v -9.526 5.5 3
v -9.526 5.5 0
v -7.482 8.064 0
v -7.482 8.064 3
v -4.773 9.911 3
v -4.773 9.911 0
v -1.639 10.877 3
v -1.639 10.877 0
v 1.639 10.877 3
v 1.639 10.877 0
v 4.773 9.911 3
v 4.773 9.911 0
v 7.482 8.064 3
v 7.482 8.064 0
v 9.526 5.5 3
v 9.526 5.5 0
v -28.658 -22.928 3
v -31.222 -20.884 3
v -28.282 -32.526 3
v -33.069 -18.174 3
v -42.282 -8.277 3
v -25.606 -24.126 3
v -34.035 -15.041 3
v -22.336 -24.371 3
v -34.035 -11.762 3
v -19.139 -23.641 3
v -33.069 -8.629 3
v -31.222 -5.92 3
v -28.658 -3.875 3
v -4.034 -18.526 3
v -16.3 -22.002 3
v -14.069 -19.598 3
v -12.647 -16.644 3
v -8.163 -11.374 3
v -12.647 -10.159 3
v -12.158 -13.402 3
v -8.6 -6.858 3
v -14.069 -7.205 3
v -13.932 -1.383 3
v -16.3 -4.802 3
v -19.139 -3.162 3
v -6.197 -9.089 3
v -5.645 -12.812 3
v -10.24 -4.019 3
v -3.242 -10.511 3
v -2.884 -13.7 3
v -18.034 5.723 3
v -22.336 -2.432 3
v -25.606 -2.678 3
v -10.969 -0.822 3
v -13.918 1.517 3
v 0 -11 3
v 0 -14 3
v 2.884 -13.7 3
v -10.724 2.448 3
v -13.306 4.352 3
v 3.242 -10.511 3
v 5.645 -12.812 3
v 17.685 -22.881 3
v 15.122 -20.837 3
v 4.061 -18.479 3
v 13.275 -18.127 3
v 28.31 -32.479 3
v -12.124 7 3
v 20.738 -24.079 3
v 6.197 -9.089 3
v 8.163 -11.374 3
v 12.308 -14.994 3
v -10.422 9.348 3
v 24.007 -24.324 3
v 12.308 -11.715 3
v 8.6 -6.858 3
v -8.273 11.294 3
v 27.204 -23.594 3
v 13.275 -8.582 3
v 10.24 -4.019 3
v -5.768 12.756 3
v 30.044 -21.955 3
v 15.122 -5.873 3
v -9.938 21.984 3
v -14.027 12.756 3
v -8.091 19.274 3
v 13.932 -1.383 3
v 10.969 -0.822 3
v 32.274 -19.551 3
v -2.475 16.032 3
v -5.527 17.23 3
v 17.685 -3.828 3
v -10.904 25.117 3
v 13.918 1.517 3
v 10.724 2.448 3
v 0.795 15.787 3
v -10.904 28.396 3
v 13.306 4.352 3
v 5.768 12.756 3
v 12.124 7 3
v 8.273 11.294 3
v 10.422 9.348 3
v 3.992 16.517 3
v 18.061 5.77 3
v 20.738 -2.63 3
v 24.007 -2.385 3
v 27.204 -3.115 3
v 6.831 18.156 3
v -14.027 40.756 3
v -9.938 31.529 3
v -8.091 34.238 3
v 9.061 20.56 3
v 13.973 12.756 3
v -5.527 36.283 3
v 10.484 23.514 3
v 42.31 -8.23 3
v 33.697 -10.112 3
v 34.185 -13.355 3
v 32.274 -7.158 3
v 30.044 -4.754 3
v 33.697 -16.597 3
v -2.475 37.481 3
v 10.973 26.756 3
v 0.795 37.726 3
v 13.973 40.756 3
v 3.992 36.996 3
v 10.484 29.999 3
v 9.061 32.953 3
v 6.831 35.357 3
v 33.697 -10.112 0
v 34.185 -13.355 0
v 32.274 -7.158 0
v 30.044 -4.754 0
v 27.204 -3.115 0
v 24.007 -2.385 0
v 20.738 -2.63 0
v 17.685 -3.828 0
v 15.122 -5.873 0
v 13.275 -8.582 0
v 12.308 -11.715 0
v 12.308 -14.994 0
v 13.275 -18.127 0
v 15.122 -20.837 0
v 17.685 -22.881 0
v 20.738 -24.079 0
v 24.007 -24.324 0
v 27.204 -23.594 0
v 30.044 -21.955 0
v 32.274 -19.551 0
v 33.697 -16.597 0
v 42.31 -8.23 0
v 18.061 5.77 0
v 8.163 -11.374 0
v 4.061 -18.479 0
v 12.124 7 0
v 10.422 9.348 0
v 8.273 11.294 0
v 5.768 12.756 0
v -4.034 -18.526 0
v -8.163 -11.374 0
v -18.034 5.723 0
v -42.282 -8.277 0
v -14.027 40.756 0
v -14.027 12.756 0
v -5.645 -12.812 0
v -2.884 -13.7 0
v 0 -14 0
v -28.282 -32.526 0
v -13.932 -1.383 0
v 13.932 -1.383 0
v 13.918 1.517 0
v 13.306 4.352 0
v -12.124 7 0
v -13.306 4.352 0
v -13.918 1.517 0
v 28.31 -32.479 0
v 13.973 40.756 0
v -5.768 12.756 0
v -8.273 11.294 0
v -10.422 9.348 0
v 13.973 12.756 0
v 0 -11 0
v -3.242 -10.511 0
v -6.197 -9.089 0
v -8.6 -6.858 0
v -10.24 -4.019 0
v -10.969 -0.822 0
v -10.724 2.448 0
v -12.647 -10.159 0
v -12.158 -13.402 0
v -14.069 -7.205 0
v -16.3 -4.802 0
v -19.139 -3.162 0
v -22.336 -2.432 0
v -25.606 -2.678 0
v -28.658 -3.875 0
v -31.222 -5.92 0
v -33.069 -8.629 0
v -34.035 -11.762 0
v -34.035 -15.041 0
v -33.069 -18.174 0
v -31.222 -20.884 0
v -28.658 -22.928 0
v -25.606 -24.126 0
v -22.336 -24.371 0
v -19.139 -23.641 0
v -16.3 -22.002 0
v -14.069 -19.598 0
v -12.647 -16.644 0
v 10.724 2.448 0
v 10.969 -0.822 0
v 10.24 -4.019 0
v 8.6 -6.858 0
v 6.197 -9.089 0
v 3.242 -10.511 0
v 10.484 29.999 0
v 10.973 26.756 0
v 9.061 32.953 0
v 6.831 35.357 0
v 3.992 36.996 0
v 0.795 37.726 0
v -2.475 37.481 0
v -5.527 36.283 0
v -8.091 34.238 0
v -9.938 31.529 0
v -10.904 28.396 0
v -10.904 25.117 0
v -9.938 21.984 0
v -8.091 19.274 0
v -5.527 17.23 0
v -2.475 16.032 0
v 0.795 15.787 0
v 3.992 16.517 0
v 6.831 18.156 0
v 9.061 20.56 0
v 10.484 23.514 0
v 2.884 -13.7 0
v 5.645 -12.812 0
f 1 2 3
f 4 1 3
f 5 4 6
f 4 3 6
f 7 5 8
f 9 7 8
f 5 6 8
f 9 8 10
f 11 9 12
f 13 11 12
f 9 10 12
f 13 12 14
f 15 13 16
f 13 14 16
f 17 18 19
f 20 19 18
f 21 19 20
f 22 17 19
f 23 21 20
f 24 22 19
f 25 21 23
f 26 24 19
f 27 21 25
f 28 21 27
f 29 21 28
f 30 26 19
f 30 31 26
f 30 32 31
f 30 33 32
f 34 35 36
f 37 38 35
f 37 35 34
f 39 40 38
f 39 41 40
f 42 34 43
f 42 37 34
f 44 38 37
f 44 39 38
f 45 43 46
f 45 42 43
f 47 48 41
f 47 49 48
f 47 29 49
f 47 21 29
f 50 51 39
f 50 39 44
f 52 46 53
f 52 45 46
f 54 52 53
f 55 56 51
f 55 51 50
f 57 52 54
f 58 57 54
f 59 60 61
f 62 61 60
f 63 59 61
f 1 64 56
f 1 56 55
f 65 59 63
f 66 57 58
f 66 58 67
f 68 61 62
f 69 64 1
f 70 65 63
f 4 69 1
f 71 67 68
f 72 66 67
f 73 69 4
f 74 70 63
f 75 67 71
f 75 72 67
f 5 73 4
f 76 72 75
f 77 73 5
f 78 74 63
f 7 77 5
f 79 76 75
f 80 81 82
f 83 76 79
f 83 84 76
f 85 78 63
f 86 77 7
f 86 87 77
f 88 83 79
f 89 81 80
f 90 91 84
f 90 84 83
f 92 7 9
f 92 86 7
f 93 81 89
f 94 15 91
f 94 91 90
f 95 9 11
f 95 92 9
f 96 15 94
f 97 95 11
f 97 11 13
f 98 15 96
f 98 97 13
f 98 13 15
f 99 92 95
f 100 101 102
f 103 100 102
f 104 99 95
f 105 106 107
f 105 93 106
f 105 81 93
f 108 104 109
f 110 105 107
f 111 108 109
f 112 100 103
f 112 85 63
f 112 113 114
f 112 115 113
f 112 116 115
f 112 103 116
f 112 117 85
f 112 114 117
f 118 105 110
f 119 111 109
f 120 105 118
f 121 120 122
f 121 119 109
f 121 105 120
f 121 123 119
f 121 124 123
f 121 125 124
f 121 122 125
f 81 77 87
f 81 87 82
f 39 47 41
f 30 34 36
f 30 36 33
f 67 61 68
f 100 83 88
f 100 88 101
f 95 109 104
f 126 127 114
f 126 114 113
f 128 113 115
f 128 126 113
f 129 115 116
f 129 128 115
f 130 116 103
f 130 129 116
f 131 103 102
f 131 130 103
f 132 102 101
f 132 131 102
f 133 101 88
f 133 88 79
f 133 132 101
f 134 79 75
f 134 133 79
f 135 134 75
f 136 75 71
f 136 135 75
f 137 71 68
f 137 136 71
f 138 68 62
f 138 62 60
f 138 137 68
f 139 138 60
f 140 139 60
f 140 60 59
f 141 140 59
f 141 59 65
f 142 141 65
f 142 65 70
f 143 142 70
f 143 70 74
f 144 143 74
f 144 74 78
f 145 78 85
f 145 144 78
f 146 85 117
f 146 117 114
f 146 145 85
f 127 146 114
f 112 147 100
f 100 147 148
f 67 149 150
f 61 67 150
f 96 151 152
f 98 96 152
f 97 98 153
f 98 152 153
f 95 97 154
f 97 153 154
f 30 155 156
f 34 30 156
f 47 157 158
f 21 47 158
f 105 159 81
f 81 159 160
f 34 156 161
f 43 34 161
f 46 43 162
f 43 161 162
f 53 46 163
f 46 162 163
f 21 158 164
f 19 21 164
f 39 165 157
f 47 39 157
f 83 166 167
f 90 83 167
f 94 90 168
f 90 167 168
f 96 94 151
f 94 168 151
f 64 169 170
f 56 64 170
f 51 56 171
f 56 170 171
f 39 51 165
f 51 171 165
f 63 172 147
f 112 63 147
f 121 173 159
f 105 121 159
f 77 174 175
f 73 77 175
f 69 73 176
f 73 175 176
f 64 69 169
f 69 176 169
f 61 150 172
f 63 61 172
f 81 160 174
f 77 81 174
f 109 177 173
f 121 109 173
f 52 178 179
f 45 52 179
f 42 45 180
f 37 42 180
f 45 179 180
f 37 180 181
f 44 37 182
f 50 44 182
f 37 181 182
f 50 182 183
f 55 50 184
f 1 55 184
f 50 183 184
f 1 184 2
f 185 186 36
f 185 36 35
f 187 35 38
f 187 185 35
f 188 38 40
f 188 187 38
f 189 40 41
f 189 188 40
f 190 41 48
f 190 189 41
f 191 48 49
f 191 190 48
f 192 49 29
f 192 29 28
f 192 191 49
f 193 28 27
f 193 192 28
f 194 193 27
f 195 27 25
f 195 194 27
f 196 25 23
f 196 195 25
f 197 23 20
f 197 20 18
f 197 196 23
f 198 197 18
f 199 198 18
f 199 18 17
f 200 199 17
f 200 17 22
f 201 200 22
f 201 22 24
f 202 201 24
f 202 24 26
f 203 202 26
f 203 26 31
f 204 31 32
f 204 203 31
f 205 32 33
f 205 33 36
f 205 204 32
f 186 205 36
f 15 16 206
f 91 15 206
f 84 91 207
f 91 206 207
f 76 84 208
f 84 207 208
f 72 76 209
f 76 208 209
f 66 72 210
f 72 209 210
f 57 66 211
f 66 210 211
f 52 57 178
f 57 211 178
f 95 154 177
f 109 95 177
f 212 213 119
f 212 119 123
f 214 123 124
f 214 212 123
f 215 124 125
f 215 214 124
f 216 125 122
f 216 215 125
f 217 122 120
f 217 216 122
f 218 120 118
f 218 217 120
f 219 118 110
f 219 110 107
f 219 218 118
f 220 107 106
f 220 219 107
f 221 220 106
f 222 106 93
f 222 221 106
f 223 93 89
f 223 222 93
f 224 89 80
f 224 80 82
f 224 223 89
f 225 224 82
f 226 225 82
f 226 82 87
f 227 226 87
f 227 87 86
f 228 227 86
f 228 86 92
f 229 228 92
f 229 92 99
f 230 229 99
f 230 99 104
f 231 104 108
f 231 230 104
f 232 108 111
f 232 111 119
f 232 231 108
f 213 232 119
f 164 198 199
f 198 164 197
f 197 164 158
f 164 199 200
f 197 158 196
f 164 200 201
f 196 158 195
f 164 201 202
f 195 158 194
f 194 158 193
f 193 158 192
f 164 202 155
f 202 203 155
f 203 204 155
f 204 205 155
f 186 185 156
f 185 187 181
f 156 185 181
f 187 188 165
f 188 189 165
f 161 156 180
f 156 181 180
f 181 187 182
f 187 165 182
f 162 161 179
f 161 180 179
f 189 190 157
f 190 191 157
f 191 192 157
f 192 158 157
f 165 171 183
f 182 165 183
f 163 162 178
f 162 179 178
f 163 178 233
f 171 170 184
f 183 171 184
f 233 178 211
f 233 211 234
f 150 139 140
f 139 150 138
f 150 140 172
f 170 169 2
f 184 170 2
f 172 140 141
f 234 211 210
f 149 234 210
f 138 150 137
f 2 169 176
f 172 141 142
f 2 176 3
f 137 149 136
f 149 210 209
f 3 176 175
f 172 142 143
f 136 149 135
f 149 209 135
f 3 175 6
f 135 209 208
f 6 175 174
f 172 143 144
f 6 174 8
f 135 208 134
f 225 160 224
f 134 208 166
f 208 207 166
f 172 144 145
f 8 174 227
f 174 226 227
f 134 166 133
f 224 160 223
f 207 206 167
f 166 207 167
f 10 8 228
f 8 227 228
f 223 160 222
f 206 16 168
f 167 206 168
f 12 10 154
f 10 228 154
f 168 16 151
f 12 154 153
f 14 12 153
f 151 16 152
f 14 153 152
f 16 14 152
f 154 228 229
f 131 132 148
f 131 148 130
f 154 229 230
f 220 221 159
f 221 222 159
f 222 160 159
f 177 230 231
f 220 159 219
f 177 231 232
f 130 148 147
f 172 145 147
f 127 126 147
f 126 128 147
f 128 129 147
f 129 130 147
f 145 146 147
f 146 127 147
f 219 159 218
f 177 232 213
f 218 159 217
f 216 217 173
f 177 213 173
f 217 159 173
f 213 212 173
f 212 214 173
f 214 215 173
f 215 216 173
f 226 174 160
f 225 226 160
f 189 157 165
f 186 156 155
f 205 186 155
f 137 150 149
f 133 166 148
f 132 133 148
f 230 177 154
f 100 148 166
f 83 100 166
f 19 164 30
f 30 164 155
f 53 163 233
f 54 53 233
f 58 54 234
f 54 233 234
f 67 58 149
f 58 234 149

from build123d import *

# Parameters (mm, degrees)
F0_R     = 11
F1_DEPTH = 3


with BuildPart() as f1:
    # F0 (on Top) → F1 (new body)
    with BuildSketch(Plane.XY):
        with BuildLine():
            Line((-14.027199, 12.756373), (-5.768445, 12.756373))
            ThreePointArc((-5.768445, 12.756373), (-9.39798, 10.3768), (-12.124356, 7))
            ThreePointArc((-12.124356, 7), (-13.685562, 2.95049), (-13.931565, -1.382567))
            Line((-13.931565, -1.382567), (-18.033744, 5.722614))
            Line((-18.033744, 5.722614), (-42.282455, -8.277386))
            Line((-42.282455, -8.277386), (-28.282455, -32.526097))
            Line((-28.282455, -32.526097), (-4.033744, -18.526097))
            Line((-4.033744, -18.526097), (-8.163121, -11.373806))
            ThreePointArc((-8.163121, -11.373806), (-4.287582, -13.327289), (0, -14))
            ThreePointArc((0, -14), (4.287582, -13.327289), (8.163121, -11.373806))
            Line((8.163121, -11.373806), (4.060942, -18.478987))
            Line((4.060942, -18.478987), (28.309654, -32.478987))
            Line((28.309654, -32.478987), (42.309654, -8.230276))
            Line((42.309654, -8.230276), (18.060942, 5.769724))
            Line((18.060942, 5.769724), (13.931565, -1.382567))
            ThreePointArc((13.931565, -1.382567), (13.685562, 2.95049), (12.124356, 7))
            ThreePointArc((12.124356, 7), (9.39798, 10.3768), (5.768445, 12.756373))
            Line((5.768445, 12.756373), (13.972801, 12.756373))
            Line((13.972801, 12.756373), (13.972801, 40.756373))
            Line((13.972801, 40.756373), (-14.027199, 40.756373))
            Line((-14.027199, 40.756373), (-14.027199, 12.756373))
        make_face()
        with Locations((-23.158099, -13.401741)):
            Circle(F0_R, mode=Mode.SUBTRACT)
        with BuildLine():
            ThreePointArc((-9.526279, 5.5), (0, 11), (9.526279, 5.5))
            ThreePointArc((9.526279, 5.5), (9.526279, -5.5), (0, -11))
            ThreePointArc((0, -11), (-9.526279, -5.5), (-9.526279, 5.5))
        make_face(mode=Mode.SUBTRACT)
        with Locations((23.185298, -13.354632)):
            Circle(F0_R, mode=Mode.SUBTRACT)
        with Locations((-0.027199, 26.756373)):
            Circle(F0_R, mode=Mode.SUBTRACT)
    extrude(amount=F1_DEPTH)


solid = f1.part
